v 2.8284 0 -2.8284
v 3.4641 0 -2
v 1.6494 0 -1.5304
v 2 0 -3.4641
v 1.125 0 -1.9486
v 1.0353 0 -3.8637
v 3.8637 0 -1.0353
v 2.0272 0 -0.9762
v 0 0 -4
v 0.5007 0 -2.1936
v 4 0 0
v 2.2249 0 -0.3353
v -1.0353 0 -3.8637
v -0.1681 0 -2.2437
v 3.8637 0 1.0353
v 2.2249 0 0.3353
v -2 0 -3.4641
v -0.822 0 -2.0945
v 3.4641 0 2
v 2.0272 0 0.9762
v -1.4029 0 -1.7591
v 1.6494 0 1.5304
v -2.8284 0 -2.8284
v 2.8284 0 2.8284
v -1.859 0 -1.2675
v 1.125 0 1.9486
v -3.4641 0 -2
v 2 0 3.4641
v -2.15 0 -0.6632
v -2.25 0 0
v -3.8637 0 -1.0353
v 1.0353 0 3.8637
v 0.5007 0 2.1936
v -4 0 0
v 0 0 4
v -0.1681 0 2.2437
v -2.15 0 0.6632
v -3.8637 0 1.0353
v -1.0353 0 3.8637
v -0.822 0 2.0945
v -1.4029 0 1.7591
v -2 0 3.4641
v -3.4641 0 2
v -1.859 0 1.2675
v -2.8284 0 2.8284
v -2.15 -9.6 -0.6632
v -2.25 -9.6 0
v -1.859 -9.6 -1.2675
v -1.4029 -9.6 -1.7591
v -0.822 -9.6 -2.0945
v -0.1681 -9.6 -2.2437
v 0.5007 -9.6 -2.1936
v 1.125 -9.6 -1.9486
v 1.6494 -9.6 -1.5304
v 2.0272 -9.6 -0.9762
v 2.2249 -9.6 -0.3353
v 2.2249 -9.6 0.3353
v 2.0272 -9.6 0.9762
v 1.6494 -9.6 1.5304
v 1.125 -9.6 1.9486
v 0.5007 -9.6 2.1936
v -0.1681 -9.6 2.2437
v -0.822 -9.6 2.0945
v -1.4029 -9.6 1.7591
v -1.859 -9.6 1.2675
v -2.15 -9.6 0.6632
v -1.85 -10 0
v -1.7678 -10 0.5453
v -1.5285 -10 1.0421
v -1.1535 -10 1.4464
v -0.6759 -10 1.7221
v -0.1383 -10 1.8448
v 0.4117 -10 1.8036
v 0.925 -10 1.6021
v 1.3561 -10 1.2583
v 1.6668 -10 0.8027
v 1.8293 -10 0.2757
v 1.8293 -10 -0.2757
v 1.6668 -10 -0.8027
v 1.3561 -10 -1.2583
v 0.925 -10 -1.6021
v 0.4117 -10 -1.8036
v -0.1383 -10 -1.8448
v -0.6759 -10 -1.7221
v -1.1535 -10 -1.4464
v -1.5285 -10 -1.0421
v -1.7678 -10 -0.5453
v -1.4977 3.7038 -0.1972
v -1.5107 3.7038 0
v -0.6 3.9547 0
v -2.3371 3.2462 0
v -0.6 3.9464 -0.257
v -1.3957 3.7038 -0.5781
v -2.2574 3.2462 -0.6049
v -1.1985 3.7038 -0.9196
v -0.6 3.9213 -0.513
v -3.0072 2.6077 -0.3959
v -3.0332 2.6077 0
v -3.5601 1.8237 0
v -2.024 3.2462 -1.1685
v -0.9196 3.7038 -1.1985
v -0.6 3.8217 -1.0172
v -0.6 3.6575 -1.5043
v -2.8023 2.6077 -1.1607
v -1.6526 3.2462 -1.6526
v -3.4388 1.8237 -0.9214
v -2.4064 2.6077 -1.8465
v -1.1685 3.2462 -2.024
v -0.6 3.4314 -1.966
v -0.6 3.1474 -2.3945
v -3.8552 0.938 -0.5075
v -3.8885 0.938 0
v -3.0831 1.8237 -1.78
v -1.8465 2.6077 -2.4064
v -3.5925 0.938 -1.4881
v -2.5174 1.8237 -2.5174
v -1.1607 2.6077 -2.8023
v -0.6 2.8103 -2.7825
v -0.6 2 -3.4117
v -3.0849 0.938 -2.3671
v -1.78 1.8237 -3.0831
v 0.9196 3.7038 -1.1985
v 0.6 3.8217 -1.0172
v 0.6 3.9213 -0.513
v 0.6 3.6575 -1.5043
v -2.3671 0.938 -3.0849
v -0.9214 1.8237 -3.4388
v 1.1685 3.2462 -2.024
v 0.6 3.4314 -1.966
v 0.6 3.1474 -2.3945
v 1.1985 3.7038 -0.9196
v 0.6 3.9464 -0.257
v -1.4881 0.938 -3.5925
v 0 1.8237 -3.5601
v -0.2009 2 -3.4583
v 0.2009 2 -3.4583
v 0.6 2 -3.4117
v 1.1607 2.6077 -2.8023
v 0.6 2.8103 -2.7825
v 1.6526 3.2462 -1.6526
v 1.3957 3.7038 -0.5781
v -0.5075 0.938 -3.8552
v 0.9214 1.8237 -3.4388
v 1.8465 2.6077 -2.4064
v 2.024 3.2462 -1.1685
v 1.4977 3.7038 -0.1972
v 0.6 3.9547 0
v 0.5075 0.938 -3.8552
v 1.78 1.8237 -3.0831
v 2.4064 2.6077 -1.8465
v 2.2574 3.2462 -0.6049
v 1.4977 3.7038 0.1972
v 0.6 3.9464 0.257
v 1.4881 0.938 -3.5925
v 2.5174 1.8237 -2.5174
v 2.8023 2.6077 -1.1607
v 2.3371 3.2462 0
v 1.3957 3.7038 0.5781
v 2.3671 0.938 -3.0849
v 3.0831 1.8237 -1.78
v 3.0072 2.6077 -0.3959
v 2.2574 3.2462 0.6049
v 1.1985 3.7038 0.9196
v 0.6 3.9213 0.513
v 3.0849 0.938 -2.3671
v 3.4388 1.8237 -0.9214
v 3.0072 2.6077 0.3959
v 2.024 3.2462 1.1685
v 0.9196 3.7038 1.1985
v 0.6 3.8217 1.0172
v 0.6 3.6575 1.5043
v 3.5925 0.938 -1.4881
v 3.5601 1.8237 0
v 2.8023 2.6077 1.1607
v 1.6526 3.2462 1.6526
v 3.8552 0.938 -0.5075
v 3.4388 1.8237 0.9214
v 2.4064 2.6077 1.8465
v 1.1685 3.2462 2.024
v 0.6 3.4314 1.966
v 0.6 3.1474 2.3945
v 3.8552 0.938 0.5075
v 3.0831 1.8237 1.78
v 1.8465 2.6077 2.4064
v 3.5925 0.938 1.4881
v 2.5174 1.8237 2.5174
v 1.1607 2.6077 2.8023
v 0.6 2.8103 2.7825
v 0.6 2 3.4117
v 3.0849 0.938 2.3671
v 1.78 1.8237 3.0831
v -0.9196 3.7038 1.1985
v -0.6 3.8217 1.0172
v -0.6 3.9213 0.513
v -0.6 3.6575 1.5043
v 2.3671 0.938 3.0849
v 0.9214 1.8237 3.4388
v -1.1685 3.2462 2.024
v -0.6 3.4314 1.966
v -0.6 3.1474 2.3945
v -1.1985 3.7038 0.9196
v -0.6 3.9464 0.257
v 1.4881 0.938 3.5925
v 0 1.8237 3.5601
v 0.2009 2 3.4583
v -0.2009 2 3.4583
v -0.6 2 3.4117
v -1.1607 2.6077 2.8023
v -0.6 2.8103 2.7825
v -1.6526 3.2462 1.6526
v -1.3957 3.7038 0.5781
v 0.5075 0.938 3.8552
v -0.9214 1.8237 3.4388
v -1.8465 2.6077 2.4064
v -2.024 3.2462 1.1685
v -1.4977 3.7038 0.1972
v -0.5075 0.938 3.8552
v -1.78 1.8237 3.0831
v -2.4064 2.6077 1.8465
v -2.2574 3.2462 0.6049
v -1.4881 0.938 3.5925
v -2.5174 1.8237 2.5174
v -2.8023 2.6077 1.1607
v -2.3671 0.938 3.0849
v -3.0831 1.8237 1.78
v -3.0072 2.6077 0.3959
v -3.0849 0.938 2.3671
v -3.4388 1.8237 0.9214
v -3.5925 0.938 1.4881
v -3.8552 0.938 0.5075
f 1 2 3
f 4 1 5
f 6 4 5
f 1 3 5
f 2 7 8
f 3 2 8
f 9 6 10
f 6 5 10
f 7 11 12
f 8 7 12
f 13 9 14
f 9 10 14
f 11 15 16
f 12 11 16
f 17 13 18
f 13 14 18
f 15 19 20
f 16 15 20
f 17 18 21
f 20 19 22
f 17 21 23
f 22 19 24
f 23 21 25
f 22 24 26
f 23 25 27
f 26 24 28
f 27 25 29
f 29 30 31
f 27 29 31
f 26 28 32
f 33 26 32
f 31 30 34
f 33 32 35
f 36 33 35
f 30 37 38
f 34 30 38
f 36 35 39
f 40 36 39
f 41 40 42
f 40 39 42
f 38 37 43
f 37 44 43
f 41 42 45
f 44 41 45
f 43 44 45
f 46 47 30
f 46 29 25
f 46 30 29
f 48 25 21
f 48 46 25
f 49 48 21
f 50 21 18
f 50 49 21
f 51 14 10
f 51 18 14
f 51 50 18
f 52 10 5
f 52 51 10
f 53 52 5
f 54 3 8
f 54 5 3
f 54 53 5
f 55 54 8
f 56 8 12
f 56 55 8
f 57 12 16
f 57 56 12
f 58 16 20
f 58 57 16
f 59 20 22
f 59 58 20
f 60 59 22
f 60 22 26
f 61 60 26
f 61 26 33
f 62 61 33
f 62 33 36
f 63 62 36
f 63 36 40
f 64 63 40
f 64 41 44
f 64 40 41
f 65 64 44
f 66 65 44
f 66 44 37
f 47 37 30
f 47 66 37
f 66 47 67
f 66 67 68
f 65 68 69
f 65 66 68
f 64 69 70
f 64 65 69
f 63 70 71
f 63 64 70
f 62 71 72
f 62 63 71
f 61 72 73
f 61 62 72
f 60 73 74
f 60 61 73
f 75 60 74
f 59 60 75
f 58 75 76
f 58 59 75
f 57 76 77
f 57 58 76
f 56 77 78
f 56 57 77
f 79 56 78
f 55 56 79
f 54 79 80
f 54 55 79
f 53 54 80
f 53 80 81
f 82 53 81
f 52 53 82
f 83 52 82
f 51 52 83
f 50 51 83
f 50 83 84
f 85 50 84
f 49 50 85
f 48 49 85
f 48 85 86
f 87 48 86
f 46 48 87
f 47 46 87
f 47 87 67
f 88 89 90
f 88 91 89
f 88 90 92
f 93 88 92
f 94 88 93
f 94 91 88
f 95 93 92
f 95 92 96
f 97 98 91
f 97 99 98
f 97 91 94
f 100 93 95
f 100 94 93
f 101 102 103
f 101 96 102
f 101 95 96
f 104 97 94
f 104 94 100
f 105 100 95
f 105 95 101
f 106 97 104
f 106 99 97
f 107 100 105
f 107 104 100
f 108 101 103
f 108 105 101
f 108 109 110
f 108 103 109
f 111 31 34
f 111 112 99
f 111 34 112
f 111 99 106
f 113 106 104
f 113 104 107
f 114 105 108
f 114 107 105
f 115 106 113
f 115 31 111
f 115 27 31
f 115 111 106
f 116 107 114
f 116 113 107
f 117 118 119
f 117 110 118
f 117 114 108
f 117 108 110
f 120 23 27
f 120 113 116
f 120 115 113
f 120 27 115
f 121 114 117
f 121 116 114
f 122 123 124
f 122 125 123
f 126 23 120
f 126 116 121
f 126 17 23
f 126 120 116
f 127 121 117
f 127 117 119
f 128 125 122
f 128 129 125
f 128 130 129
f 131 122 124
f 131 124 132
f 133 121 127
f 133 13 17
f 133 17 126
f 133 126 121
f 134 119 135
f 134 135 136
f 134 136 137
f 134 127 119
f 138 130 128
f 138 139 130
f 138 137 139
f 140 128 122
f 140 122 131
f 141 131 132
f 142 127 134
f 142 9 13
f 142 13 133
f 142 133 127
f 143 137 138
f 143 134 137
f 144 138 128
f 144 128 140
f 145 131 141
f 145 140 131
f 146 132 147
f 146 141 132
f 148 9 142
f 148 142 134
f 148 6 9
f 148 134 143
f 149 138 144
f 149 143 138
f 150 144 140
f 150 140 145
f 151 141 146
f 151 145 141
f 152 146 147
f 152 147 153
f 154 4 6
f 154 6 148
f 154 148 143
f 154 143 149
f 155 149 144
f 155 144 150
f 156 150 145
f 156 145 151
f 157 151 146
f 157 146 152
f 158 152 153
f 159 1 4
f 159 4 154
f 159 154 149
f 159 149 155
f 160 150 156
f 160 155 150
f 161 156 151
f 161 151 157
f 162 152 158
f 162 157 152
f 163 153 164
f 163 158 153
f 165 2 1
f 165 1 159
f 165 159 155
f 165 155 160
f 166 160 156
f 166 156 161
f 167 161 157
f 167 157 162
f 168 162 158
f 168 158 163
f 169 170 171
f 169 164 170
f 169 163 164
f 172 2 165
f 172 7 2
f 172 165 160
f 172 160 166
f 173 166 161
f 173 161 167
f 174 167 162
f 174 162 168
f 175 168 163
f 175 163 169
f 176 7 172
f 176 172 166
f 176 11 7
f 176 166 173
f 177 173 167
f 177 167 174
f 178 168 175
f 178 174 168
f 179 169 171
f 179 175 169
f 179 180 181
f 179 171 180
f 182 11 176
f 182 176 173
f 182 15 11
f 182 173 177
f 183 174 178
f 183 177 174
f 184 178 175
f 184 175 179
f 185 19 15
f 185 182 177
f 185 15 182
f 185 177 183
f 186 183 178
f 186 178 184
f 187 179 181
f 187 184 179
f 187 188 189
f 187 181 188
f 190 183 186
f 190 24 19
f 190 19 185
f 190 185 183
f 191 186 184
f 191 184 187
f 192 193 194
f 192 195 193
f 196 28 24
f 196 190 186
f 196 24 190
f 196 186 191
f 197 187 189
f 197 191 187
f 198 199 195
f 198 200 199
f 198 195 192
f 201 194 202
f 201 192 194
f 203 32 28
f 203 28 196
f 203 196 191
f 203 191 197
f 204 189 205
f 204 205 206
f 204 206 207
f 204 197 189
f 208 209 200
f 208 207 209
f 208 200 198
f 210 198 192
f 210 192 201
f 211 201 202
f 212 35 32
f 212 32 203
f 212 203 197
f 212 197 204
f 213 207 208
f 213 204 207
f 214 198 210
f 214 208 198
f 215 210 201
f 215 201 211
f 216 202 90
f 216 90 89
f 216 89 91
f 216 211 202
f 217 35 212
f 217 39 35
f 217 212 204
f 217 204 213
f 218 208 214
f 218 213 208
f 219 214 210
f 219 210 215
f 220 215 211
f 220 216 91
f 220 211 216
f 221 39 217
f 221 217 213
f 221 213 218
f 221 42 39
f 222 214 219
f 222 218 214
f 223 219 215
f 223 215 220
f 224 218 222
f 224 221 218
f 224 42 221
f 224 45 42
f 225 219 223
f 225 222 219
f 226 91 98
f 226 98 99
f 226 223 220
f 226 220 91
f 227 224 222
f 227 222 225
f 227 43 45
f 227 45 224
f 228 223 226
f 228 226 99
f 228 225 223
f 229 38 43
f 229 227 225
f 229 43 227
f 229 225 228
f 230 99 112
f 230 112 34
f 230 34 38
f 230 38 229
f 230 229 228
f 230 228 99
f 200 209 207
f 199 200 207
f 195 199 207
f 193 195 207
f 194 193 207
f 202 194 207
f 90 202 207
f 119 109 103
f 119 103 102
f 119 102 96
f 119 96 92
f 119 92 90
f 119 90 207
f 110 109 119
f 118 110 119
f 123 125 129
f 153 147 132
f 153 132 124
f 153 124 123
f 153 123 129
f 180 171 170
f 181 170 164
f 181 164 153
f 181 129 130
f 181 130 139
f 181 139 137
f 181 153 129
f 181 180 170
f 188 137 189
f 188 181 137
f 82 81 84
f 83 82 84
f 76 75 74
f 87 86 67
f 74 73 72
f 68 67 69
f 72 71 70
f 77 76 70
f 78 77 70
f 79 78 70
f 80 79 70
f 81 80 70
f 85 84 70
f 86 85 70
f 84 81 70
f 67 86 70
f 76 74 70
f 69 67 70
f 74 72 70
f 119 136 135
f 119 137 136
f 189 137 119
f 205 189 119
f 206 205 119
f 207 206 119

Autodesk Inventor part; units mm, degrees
ref_plane "YZ Plane" through (0, 0, 0) normal (1, 0, 0) x (0, 1, 0)
ref_plane "XY Plane" through (0, 0, 0) normal (0, 0, 1) x (1, 0, 0)
sketch "Esboço1" plane through (0, 0, 0) normal (0, 0, 1) x (1, 0, 0)
  line L0 (-2.25, 0) -> (-2.25, -10)
  line L1 (-2.25, -10) -> (0, -10)
  line L2 (0, -10) -> (0, 0)
  line L3 (0, 0) -> (0, 4)
  line L4 (-2.25, 0) -> (-4, 0)
  arc A0 (0, 4) -> (-4, 0) centre (0, 0) ccw
  dimension "d1" = 2.25
  dimension "d2" = 10
revolve "Revolução1" add sketch "Esboço1" angle 360 about axis through (0, -10, 0) along (0, 1, 0)
thread "Rosca1" size "M4.5x0.5" class "6g" standard "ANSI Metric M Profile" length 7
chamfer "Chanfro1" distance 0.4 angle 45 1 edges at (2.25, -10, 0)
ref_plane "Plano de trabalho1" through (0, 4, 0) normal (0, 1, 0) x (-1, 0, 0)
sketch "Esboço2" plane through (0, 4, 0) normal (0, 1, 0) x (-1, 0, 0)
  line L0 (0.6, -6.0887) -> (-0.6, -6.0887)
  line L1 (-0.6, -6.0887) -> (-0.6, 6.0887)
  line L2 (-0.6, 6.0887) -> (0.6, 6.0887)
  line L3 (0.6, 6.0887) -> (0.6, -6.0887)
  line L4 (0.6, -6.0887) -> (-0.6, 6.0887) construction
  line L5 (-0.6, -6.0887) -> (0.6, 6.0887) construction
  point P0 (0, 0)
  dimension "d10" = 1.2
extrude "Extrusão1" cut sketch "Esboço2" against normal blind 2
properties part number "Parafuso"
